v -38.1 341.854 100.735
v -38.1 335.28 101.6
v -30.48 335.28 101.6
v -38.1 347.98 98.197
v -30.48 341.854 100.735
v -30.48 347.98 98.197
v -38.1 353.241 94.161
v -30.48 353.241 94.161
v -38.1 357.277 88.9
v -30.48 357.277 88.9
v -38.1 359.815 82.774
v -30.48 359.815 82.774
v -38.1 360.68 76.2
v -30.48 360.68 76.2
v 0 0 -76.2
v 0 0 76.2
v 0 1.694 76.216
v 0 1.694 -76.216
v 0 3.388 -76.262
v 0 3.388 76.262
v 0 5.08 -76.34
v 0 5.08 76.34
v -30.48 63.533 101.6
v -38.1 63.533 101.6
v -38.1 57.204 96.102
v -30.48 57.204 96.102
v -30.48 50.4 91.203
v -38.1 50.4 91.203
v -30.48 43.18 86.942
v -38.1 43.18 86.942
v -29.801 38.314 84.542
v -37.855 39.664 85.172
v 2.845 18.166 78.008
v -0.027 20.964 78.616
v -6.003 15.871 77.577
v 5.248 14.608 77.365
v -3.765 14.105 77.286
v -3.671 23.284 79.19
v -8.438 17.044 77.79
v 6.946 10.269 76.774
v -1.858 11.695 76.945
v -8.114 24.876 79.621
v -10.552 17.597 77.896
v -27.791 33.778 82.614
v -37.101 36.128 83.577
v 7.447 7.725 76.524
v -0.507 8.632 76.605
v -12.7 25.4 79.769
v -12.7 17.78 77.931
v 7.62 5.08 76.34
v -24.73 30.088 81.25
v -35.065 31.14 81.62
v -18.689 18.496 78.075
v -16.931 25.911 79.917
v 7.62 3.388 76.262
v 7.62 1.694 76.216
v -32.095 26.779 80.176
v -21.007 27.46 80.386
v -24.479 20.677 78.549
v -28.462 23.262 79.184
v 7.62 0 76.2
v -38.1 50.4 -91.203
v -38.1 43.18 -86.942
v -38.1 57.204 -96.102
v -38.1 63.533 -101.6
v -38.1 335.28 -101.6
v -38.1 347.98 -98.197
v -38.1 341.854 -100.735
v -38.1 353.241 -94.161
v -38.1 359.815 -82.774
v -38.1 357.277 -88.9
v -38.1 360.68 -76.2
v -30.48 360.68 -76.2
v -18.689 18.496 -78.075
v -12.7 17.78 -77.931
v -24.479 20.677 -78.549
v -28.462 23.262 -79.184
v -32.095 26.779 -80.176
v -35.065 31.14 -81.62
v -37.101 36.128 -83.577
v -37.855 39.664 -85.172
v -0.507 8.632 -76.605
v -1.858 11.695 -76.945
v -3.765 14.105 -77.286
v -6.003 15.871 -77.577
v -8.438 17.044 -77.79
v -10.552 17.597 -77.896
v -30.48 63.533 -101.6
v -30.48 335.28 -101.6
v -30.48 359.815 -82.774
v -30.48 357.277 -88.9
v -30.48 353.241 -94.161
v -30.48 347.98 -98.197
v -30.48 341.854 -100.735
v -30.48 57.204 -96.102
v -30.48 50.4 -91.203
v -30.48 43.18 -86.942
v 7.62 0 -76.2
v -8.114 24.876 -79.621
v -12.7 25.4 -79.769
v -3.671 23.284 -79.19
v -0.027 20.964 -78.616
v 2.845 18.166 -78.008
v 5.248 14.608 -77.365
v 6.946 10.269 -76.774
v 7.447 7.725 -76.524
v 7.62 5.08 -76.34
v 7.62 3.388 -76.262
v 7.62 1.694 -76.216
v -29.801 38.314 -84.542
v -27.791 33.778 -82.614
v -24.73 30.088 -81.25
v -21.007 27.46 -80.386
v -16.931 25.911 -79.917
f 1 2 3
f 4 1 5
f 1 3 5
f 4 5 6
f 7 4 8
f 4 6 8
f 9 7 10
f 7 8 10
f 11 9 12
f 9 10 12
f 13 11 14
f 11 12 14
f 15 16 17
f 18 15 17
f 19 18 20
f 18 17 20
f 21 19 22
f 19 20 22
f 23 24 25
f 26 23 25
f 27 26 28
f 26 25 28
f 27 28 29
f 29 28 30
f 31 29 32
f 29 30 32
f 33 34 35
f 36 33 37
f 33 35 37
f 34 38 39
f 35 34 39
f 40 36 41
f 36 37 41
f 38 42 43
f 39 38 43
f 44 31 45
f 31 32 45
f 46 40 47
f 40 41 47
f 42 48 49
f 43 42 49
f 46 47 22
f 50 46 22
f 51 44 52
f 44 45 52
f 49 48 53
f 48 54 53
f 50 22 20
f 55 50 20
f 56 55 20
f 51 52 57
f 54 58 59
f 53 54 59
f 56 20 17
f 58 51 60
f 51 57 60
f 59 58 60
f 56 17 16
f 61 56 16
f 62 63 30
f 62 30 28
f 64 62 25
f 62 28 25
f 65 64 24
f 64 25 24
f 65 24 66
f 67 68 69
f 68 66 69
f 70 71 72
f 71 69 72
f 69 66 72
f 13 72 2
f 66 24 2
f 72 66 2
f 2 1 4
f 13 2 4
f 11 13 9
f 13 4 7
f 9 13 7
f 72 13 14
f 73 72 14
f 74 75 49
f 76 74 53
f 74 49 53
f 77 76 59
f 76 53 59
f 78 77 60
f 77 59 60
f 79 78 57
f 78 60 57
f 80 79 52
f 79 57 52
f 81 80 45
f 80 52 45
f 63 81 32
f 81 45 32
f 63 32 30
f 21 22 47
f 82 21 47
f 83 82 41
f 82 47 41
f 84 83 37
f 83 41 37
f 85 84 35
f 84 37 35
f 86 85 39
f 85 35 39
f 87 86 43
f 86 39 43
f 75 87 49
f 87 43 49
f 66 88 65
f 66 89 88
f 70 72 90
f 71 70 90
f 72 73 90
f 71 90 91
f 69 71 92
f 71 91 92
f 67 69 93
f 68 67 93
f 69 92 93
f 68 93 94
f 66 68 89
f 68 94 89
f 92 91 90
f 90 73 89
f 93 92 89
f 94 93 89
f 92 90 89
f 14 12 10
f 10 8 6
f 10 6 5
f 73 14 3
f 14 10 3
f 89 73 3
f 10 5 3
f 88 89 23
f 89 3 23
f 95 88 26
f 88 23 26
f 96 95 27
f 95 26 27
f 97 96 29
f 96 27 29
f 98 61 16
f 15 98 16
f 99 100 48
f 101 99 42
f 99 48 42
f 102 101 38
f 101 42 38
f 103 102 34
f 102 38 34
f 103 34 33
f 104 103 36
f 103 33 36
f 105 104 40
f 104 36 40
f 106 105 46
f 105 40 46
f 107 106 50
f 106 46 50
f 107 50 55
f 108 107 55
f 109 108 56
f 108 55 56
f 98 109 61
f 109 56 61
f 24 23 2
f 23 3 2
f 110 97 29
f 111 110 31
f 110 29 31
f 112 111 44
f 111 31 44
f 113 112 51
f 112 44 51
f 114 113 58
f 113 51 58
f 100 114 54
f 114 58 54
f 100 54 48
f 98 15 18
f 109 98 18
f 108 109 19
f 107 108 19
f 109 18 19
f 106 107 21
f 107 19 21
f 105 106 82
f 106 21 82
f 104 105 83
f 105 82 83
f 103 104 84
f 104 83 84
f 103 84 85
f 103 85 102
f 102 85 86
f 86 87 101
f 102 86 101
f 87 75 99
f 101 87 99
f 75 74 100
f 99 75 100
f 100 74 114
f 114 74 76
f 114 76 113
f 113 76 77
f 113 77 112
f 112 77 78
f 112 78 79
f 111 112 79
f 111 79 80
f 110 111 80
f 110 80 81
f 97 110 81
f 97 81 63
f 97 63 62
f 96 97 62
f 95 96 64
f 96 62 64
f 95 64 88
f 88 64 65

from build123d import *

# Parameters (mm, degrees)
EXTRUDE_THIN1_DEPTH     = 101.6
FILLET1_R               = 25.4
FILLET2_R               = 25.4
CUT_EXTRUDE1_DEPTH      = 10.922
CUT_EXTRUDE1_DEPTH_BACK = 54.61


with BuildPart() as part:
    # Sketch1 → Extrude-Thin1 (new, symmetric)
    with BuildSketch(Plane.XY):
        with BuildLine():
            Line((0, 0), (0, 5.08))
            ThreePointArc((0, 5.08), (-3.719743879, 14.060256121), (-12.7, 17.78))
            ThreePointArc((-12.7, 17.78), (-30.660512242, 25.219487758), (-38.1, 43.18))
            Line((-38.1, 43.18), (-38.1, 360.68))
            Line((-38.1, 360.68), (-30.48, 360.68))
            Line((-30.48, 360.68), (-30.48, 43.18))
            ThreePointArc((-30.48, 43.18), (-25.272358569, 30.607641431), (-12.7, 25.4))
            ThreePointArc((-12.7, 25.4), (1.668409794, 19.448409794), (7.62, 5.08))
            Line((7.62, 5.08), (7.62, 0))
            Line((7.62, 0), (0, 0))
        make_face()
    extrude(amount=EXTRUDE_THIN1_DEPTH, both=True)

    # Fillet1
    fillet1_edges = [part.edges().sort_by_distance(p)[0] for p in [
        (-34.29, 360.68, 101.6),
    ]]
    fillet(fillet1_edges, radius=FILLET1_R)

    # Fillet2
    fillet2_edges = [part.edges().sort_by_distance(p)[0] for p in [
        (-34.29, 360.68, -101.6),
    ]]
    fillet(fillet2_edges, radius=FILLET2_R)

    # Sketch3 → Cut-Extrude1 (cut, two sides: drawn at the far end of the back side and taken through both)
    with BuildSketch(Plane(origin=(7.62, 0, 0), x_dir=(0, 0, -1), z_dir=(1, 0, 0)).offset(-CUT_EXTRUDE1_DEPTH_BACK)):
        with BuildLine():
            Line((-101.6, 0), (-101.6, 63.533291796))
            ThreePointArc((-101.6, 63.533291796), (-82.785279567, 34.211252412), (-76.2, 0))
            Line((-76.2, 0), (-101.6, 0))
        make_face()
        with BuildLine():
            Line((101.6, 0), (76.2, 0))
            ThreePointArc((76.2, 0), (82.785279567, 34.211252412), (101.6, 63.533291796))
            Line((101.6, 63.533291796), (101.6, 0))
        make_face()
    extrude(amount=CUT_EXTRUDE1_DEPTH + CUT_EXTRUDE1_DEPTH_BACK, mode=Mode.SUBTRACT)


solid = part.part
